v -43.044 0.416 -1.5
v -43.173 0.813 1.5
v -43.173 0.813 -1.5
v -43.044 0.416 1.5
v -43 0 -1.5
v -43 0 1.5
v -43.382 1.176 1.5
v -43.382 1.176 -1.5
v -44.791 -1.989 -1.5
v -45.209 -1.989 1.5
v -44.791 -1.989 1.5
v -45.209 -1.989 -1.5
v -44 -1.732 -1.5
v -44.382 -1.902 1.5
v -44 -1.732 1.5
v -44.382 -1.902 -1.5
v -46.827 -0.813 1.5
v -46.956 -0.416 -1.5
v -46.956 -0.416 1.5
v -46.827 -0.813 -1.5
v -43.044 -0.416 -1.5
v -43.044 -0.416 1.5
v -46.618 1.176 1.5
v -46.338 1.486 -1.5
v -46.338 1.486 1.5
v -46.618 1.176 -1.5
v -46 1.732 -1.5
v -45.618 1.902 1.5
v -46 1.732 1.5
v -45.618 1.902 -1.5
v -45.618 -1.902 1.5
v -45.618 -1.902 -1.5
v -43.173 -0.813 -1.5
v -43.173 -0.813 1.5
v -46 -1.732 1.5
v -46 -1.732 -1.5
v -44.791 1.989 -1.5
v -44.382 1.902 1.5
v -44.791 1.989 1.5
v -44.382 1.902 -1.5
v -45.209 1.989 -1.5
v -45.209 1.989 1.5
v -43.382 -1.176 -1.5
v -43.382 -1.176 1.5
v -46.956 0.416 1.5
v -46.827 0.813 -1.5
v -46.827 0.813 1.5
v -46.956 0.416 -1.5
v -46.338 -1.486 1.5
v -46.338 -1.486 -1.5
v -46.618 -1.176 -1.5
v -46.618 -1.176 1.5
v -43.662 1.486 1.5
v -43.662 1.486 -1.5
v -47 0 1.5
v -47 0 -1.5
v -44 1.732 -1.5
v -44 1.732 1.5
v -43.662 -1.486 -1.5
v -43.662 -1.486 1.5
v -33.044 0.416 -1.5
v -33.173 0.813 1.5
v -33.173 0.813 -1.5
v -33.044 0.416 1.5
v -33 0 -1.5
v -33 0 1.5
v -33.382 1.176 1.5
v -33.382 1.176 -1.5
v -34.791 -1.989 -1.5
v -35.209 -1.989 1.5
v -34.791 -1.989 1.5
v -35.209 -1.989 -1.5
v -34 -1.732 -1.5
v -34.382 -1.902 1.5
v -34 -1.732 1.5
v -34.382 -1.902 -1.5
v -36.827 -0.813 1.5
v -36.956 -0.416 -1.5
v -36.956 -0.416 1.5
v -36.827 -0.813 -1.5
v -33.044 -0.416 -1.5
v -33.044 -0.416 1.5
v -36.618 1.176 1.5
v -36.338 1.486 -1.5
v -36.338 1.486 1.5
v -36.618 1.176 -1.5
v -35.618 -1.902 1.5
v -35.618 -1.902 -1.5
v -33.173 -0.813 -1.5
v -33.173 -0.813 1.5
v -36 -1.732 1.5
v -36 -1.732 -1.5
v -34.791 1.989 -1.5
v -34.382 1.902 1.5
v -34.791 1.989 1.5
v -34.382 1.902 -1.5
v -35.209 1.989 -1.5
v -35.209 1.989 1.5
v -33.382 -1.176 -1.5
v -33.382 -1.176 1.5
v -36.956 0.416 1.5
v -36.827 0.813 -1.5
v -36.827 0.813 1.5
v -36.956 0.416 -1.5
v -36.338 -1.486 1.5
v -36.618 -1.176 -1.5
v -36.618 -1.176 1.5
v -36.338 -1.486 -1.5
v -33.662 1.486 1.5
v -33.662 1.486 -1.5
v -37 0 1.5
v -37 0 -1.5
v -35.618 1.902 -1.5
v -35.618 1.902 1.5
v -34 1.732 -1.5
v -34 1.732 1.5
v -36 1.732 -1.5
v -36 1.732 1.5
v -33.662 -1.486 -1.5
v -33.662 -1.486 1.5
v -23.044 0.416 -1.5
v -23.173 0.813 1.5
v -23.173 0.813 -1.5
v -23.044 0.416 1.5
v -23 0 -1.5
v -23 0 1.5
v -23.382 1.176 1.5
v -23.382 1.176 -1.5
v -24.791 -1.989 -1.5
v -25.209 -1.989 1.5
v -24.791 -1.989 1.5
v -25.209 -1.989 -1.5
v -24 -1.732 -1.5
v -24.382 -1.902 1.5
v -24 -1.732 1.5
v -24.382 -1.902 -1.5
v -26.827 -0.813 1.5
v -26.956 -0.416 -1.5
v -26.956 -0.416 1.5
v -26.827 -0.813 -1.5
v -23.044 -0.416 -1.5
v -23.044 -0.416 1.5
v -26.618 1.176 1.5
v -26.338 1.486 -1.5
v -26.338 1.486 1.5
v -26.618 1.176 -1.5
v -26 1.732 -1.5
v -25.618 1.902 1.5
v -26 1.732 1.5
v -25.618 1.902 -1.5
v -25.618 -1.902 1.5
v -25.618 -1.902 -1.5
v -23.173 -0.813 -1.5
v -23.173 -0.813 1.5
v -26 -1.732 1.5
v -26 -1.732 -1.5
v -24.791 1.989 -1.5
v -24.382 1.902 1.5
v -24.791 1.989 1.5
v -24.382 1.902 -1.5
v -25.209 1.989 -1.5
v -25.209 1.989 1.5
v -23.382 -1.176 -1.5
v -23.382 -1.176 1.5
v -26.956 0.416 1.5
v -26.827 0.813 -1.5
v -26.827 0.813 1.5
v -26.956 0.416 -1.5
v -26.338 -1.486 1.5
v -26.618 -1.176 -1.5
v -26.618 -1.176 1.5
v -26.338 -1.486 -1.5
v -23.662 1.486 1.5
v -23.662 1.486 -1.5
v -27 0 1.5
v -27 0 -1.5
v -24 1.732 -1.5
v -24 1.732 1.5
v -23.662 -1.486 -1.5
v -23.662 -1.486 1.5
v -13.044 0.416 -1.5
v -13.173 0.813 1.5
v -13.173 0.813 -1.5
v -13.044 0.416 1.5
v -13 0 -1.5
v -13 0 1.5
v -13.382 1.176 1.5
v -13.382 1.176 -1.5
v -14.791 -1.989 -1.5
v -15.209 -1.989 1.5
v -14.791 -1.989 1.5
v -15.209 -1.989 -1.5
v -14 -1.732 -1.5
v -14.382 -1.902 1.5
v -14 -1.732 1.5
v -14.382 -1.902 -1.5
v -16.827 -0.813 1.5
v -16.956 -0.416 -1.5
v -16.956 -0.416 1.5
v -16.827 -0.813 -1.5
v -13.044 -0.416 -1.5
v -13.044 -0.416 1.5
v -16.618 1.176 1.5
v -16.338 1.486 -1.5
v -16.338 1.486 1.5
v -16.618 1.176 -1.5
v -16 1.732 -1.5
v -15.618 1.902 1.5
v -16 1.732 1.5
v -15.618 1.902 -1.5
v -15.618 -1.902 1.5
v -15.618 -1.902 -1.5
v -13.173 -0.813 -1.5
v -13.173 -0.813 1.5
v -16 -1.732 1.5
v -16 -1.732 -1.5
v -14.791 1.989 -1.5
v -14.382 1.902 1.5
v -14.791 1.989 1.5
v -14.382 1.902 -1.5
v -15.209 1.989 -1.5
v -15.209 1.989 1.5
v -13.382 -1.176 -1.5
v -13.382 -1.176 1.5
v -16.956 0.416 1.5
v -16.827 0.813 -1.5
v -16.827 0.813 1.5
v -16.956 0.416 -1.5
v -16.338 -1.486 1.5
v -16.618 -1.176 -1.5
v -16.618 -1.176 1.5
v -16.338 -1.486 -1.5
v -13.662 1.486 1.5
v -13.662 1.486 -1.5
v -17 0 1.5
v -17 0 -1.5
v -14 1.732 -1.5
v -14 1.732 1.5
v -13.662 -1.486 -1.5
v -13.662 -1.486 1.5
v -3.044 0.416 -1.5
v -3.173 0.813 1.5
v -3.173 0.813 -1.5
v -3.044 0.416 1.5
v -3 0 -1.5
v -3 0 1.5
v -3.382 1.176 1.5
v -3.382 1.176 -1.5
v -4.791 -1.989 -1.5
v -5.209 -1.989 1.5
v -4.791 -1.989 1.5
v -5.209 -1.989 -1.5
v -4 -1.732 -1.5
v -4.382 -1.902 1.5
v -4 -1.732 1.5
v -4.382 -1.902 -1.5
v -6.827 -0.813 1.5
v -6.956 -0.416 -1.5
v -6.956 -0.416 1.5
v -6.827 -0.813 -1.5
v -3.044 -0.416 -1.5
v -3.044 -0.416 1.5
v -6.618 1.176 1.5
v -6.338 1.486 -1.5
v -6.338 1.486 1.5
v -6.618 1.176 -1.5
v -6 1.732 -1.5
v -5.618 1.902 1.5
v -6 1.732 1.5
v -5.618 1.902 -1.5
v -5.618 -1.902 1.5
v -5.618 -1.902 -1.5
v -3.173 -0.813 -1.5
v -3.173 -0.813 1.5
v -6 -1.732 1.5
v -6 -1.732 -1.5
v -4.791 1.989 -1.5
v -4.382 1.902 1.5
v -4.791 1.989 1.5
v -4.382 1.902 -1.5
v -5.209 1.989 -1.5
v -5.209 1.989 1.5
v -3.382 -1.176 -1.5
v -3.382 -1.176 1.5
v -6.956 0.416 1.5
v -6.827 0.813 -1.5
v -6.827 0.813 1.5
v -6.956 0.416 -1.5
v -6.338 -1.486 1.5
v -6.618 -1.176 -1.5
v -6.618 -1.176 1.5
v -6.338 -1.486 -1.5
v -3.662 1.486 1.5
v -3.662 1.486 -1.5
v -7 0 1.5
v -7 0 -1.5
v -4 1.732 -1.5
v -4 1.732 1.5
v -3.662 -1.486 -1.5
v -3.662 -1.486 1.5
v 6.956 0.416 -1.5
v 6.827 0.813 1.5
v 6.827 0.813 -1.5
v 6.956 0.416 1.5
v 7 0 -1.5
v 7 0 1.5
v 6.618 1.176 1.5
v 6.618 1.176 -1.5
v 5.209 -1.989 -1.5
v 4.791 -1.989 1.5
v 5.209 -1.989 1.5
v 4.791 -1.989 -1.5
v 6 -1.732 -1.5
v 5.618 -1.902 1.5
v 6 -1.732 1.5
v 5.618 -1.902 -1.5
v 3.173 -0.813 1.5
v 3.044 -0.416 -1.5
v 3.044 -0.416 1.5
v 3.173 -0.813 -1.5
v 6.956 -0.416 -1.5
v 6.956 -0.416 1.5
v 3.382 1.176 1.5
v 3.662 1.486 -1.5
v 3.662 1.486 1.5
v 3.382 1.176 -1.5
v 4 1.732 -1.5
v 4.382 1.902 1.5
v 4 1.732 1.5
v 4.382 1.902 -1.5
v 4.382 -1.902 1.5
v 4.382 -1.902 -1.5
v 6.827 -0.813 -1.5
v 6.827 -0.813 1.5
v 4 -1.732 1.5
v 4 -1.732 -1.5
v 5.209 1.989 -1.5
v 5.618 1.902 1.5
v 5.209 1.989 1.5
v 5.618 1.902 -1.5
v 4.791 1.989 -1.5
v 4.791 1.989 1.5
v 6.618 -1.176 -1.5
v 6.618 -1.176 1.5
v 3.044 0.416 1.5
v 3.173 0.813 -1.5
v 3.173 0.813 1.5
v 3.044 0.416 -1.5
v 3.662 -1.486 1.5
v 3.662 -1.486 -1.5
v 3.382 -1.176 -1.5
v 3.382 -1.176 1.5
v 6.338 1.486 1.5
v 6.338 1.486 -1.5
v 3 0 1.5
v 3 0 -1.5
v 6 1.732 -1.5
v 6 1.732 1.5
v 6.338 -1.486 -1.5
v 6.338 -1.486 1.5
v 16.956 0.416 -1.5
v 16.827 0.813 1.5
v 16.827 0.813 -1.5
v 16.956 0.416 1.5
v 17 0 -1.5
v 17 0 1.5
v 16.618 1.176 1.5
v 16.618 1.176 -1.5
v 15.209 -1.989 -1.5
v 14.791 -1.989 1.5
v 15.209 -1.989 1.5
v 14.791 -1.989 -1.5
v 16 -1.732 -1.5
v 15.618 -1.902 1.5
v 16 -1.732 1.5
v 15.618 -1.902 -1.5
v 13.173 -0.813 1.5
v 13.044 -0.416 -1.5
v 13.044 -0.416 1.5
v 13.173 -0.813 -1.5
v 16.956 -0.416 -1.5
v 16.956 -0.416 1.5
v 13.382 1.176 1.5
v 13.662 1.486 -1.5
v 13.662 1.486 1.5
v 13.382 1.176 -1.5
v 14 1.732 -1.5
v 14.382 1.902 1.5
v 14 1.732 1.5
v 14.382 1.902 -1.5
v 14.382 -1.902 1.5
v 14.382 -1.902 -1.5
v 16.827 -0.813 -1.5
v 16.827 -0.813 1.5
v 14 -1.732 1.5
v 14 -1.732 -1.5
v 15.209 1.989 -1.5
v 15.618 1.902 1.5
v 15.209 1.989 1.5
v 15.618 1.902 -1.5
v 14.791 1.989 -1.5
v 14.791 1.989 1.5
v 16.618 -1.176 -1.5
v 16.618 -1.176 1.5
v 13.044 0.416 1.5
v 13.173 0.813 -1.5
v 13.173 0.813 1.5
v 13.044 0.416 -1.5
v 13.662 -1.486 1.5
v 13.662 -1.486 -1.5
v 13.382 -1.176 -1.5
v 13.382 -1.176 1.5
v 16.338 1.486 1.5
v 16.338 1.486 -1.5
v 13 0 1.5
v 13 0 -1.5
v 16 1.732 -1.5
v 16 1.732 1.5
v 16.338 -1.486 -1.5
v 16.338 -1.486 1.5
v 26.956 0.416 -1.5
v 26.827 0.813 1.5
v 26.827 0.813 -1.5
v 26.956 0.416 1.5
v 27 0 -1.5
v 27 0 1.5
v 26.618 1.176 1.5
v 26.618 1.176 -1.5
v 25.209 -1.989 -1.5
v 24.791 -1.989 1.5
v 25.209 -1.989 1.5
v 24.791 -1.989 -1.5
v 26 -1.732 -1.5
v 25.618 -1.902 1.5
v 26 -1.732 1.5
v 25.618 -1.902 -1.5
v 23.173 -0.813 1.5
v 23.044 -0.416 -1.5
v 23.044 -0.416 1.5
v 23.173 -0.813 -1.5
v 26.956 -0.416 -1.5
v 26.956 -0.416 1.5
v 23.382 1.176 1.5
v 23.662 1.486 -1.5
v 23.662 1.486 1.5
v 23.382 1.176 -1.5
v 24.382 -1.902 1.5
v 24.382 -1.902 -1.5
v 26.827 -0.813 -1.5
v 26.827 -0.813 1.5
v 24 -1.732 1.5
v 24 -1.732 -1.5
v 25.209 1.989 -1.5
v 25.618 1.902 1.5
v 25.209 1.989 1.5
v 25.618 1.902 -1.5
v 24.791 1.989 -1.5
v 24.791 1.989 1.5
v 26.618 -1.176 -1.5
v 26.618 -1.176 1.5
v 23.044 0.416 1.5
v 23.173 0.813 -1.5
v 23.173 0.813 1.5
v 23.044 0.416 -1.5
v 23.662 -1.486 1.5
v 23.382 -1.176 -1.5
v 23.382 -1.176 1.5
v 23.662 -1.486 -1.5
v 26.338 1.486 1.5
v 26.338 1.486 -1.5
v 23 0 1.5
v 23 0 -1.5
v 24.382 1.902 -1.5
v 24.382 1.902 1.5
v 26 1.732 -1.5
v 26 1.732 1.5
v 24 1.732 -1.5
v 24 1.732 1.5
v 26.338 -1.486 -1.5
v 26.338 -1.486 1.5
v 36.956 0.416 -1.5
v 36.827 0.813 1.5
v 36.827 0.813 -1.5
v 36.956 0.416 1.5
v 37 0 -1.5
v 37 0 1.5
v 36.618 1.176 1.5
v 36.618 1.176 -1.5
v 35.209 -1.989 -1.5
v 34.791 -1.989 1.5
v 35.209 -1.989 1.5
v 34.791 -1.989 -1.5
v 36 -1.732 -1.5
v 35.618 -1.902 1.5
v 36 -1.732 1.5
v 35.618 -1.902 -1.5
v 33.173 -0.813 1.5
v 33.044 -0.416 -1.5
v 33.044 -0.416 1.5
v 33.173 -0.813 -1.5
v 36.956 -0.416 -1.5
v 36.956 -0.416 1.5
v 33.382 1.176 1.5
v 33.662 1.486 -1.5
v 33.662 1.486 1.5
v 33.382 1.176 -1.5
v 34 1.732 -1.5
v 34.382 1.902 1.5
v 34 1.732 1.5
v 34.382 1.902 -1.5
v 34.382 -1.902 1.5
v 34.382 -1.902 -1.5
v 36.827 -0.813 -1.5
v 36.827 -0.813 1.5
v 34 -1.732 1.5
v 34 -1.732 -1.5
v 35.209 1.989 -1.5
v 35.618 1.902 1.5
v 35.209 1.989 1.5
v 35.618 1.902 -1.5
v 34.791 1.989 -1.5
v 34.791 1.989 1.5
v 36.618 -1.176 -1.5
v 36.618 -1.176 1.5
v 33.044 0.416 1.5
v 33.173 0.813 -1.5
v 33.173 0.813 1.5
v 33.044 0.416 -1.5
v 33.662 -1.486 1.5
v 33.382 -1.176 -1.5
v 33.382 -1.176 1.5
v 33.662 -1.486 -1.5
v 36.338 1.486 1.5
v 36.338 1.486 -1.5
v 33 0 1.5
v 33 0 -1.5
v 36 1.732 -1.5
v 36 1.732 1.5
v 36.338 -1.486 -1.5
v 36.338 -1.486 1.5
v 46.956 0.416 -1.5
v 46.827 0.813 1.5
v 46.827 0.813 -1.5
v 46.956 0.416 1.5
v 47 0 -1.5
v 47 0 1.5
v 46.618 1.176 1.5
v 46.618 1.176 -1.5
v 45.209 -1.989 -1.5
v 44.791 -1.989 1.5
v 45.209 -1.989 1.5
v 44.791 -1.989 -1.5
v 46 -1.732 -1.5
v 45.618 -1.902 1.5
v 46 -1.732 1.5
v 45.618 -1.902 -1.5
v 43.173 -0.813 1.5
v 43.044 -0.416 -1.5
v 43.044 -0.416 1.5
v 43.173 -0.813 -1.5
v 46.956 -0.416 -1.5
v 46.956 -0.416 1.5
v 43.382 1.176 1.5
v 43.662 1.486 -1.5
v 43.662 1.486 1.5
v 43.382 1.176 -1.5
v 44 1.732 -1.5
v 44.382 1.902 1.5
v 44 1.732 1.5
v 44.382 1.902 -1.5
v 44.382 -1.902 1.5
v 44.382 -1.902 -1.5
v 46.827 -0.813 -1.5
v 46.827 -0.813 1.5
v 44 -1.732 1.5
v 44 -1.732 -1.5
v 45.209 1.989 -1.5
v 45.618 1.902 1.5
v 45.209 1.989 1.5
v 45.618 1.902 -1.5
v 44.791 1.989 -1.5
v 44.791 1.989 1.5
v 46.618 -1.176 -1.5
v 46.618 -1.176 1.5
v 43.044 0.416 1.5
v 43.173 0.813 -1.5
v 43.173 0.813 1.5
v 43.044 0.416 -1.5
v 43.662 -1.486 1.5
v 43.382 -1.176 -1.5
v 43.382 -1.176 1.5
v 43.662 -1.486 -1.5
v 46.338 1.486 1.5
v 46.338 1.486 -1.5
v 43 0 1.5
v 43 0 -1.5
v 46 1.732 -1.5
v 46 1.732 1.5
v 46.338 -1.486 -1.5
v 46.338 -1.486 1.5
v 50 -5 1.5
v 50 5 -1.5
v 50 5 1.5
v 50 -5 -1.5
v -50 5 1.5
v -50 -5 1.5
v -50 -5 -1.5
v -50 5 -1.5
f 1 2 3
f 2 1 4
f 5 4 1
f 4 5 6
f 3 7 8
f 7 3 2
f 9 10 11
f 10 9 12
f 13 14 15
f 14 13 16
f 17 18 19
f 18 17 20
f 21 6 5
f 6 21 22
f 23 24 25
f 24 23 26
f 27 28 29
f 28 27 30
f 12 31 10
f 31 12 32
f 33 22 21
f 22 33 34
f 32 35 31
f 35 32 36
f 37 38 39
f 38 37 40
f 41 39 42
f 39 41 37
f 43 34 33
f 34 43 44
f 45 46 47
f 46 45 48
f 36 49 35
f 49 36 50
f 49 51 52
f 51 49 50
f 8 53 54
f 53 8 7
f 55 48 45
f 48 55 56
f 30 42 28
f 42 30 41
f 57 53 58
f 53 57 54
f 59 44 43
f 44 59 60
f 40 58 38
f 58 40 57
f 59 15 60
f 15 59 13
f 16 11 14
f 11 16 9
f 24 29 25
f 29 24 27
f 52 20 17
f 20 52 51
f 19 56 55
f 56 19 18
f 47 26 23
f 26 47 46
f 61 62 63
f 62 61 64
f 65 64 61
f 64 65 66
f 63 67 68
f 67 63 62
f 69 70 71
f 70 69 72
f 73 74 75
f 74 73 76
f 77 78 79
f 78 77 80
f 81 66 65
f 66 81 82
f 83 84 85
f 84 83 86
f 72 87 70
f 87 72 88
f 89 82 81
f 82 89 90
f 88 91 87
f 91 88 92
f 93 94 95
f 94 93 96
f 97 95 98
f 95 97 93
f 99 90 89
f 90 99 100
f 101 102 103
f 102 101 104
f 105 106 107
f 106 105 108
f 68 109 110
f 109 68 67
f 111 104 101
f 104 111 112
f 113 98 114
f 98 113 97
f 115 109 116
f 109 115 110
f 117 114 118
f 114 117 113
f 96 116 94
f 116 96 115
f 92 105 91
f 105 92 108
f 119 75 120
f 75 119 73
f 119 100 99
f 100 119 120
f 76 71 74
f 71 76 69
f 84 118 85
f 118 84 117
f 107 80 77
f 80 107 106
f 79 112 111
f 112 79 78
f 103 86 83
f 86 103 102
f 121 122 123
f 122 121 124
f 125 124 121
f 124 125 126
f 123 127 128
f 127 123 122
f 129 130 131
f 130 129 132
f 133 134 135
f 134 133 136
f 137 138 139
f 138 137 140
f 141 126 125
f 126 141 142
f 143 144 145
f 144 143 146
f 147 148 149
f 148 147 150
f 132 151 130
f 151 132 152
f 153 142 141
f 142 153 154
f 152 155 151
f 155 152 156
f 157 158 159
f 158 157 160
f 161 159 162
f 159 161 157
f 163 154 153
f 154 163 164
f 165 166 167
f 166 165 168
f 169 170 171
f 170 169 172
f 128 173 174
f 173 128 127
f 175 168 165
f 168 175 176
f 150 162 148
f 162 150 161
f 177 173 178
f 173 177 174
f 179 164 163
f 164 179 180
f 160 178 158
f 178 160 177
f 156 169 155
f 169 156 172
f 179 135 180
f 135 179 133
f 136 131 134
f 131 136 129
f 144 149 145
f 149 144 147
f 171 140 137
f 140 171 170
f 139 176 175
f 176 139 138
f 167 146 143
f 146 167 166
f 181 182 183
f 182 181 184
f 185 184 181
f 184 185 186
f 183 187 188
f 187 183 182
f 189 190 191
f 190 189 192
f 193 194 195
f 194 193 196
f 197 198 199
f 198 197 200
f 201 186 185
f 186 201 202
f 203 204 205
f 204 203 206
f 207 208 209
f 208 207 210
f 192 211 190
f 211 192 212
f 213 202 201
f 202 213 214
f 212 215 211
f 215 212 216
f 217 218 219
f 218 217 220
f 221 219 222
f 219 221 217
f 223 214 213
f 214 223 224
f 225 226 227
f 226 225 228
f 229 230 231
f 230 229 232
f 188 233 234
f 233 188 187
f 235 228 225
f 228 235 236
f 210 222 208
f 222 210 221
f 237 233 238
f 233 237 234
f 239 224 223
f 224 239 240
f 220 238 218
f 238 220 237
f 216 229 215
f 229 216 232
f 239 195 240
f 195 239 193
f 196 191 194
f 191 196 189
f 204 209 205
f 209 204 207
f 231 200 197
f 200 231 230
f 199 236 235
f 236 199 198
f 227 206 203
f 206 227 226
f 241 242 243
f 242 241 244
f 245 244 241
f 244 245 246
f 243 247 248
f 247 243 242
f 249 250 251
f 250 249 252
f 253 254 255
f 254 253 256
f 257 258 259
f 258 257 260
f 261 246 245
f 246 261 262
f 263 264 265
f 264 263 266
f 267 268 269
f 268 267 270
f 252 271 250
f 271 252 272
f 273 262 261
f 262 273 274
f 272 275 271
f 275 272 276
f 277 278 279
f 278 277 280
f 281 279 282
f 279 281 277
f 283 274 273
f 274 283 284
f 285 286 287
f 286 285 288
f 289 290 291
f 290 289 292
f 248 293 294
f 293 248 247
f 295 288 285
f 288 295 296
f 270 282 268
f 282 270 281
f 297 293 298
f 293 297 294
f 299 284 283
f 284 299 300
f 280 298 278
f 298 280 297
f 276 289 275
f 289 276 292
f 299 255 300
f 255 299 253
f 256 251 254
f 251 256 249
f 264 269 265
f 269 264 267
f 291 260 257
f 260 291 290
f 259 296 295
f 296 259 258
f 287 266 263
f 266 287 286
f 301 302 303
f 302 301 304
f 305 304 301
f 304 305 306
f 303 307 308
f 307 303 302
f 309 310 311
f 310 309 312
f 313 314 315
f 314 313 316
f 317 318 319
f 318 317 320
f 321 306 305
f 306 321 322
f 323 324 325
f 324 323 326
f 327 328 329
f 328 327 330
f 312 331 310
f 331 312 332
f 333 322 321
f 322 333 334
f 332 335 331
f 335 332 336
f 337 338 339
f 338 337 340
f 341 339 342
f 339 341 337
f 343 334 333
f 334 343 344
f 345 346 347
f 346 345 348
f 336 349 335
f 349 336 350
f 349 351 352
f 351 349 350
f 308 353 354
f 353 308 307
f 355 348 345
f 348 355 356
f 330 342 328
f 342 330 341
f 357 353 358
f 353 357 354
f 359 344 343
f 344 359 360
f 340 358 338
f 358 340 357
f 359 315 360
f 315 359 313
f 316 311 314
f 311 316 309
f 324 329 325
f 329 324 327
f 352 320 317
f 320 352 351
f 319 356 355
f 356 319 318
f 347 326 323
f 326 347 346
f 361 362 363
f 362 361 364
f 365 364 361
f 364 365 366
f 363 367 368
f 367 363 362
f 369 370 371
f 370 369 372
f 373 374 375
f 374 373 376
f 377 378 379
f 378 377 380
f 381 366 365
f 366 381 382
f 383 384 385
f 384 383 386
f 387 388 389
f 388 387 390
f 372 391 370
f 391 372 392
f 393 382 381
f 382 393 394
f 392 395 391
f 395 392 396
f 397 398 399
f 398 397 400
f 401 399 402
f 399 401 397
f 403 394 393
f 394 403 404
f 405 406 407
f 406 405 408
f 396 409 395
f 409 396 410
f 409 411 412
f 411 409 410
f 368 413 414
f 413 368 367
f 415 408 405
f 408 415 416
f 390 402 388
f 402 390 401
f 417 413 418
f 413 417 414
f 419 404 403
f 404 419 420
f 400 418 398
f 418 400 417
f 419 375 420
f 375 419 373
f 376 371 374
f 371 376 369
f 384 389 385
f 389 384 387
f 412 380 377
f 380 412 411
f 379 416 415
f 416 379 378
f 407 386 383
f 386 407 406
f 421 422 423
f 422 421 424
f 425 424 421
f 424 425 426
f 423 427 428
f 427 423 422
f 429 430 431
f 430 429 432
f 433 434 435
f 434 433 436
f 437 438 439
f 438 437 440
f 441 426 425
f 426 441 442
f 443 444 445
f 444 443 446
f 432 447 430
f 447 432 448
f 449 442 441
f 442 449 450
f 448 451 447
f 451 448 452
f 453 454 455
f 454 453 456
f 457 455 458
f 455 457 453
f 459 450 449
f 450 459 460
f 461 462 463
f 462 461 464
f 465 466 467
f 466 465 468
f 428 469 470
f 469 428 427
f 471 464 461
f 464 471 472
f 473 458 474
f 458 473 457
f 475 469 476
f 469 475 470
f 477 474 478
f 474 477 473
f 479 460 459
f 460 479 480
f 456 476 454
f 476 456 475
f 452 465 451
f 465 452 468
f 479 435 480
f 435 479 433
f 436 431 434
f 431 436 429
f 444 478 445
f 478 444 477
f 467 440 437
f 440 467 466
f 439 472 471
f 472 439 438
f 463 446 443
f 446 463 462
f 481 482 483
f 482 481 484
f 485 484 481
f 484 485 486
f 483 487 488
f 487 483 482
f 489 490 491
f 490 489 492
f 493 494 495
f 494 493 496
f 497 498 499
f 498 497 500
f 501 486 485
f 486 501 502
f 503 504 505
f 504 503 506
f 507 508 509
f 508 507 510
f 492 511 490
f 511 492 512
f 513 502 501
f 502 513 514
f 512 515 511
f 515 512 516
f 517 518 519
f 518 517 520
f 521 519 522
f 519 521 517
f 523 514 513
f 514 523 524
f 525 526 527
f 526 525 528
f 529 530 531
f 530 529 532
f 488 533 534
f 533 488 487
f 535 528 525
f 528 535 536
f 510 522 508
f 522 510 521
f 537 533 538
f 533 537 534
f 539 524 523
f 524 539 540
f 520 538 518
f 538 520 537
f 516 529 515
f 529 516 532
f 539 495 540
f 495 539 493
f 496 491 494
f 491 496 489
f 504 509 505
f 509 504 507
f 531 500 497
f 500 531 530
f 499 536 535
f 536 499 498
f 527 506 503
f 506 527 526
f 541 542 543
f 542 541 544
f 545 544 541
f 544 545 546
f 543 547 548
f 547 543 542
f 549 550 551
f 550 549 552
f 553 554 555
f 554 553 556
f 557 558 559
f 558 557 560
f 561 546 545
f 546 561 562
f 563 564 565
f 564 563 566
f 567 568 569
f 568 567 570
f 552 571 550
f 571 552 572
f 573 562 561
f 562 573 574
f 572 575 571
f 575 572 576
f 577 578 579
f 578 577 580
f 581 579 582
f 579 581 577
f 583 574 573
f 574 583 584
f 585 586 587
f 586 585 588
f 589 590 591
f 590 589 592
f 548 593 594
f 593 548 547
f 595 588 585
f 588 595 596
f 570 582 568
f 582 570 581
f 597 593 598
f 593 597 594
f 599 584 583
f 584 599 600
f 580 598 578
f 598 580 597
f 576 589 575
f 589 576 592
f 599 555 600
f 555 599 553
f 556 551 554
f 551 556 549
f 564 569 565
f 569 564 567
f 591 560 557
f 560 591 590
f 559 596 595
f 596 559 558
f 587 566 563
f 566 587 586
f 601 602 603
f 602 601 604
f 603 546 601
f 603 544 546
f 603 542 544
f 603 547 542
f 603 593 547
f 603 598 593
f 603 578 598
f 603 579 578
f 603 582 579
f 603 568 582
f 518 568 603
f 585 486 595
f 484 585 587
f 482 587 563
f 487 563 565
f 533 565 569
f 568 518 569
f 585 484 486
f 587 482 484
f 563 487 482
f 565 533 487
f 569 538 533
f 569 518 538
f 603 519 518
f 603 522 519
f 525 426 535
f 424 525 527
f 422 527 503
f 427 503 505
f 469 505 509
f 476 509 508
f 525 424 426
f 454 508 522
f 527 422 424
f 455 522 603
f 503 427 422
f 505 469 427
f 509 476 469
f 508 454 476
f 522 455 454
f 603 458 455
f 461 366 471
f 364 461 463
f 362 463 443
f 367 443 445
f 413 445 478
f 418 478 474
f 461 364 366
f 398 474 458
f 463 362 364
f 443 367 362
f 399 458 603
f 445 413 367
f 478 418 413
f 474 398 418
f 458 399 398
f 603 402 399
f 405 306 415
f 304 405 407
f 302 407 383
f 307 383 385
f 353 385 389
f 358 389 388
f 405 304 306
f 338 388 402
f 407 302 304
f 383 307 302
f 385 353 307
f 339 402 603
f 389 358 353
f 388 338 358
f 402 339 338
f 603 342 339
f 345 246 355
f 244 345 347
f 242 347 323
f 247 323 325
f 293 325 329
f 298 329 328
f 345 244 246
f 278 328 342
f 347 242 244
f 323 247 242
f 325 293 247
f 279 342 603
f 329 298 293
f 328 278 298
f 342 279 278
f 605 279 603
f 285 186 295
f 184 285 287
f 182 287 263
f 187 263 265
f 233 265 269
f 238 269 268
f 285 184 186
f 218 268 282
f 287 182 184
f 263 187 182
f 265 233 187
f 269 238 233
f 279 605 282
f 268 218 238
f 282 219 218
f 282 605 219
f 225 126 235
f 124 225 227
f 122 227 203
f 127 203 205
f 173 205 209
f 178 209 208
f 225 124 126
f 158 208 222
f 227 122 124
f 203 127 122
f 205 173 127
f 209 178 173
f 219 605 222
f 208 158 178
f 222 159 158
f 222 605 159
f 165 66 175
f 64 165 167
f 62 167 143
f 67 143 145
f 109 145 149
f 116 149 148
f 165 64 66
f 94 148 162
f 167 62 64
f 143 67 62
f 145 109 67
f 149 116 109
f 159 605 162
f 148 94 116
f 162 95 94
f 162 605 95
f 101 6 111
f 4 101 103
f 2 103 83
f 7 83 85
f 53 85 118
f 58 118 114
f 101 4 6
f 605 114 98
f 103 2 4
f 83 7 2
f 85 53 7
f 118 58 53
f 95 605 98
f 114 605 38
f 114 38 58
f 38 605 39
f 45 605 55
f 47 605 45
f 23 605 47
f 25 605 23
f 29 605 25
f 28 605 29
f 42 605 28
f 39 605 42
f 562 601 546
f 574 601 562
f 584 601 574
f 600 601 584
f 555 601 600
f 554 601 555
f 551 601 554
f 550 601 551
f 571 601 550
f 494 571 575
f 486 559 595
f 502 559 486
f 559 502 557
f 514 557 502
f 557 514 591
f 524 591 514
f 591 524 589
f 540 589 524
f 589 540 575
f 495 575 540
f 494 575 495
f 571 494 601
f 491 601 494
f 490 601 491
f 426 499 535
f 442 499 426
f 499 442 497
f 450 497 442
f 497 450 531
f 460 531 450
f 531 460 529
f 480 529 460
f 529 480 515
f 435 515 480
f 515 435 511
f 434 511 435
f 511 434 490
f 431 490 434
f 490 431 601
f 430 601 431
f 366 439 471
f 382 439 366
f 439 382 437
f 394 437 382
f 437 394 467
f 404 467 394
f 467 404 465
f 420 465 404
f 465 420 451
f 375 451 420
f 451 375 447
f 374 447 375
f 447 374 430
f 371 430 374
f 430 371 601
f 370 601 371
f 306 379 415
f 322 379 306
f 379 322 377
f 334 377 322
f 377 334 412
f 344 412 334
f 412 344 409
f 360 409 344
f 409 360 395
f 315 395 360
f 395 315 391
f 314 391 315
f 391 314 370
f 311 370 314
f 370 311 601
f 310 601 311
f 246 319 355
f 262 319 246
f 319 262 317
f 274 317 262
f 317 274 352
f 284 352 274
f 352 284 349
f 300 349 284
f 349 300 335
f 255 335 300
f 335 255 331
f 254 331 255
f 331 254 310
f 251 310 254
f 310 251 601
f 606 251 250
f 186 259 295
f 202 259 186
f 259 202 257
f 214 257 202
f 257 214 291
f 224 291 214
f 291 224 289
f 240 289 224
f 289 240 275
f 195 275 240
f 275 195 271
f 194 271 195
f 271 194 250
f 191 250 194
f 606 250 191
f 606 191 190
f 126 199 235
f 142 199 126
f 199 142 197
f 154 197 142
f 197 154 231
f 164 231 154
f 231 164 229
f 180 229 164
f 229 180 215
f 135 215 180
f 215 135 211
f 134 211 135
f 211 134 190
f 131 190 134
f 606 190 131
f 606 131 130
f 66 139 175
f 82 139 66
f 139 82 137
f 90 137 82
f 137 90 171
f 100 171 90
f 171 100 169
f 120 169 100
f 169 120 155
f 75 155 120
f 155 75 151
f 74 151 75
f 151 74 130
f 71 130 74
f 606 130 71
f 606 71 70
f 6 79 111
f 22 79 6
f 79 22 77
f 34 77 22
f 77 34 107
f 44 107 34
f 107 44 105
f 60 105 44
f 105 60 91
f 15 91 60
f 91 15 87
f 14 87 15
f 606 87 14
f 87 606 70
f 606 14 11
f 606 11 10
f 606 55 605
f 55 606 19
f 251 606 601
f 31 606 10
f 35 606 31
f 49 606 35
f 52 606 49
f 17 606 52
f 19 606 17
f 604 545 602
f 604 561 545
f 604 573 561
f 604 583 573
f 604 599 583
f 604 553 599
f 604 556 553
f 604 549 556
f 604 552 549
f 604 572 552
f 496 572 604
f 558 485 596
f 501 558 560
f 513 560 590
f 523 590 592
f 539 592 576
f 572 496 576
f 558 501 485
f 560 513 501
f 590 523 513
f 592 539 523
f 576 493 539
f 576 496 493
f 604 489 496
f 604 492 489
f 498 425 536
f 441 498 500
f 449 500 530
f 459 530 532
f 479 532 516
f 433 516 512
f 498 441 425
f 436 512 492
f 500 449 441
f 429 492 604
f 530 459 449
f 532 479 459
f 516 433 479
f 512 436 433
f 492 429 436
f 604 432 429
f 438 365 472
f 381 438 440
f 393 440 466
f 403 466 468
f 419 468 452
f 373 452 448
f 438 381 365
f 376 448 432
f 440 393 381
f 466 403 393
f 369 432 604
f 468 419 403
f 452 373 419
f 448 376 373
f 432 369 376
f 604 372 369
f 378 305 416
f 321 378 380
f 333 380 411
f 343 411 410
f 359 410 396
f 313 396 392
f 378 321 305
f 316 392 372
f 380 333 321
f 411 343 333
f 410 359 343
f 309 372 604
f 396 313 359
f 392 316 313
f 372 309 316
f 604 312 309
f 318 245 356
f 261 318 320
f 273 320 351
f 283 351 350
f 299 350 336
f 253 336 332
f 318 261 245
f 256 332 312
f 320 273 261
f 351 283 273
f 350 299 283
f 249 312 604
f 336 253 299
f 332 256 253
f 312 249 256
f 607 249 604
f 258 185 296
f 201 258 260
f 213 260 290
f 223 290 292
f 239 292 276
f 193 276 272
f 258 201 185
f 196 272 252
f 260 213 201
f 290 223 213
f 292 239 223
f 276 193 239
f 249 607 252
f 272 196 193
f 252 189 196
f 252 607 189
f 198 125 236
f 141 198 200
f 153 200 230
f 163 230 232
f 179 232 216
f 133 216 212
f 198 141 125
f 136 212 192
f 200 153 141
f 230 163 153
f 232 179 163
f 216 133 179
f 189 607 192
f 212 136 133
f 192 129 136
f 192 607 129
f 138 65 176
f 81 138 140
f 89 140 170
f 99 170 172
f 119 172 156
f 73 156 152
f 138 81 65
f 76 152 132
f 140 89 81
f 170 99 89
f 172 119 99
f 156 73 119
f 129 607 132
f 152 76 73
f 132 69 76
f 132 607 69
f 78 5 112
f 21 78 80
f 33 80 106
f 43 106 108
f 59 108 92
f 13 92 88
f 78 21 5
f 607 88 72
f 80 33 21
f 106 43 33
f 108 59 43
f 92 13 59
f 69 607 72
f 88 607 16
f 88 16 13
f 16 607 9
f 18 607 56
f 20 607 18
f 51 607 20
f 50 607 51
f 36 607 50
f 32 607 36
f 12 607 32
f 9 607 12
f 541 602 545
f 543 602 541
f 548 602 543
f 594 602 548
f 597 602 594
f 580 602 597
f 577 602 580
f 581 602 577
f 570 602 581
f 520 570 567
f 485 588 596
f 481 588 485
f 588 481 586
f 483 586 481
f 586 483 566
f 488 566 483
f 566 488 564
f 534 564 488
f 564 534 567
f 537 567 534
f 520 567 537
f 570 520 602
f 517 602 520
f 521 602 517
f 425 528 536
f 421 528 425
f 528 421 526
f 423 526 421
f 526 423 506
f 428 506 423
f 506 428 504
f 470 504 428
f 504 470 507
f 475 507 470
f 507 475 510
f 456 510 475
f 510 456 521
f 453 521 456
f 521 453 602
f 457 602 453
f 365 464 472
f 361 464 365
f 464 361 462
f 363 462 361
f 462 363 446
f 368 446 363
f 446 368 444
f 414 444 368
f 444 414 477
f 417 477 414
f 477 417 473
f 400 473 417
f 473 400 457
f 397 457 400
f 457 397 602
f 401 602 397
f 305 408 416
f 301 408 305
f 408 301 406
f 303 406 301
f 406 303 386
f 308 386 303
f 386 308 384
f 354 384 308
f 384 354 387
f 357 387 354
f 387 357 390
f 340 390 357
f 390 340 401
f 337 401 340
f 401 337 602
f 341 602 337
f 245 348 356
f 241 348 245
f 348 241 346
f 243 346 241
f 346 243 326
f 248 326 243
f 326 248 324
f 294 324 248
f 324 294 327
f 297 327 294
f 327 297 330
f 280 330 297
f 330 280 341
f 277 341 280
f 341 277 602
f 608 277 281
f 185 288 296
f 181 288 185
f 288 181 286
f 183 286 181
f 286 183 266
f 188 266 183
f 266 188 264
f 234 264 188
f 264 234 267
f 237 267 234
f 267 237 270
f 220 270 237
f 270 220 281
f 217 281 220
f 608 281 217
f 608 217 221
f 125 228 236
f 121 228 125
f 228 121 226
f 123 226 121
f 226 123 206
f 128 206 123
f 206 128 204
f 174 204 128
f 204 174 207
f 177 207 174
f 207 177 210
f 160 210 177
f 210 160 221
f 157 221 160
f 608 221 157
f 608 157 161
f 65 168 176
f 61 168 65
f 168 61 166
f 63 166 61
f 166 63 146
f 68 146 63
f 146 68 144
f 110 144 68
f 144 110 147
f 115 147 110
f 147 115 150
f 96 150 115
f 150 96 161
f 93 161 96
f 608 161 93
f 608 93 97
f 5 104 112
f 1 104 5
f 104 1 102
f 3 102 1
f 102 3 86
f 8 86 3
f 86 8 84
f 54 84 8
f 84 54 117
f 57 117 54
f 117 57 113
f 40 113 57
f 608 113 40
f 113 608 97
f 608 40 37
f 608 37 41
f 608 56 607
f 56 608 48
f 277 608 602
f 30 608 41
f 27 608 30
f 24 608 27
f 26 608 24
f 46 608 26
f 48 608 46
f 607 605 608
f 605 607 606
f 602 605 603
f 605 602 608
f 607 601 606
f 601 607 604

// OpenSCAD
// Ejemplo de una pieza de mecano paramétrico
//---------------------------------------------
// Definición del tamaño de taladro
drill=4;
d=10;
n=10;    // Núnmero de agujeros
// Definición tamaño pieza
lx = n*d;
anchura = 10;
grosor = 3;

// Dibujamos la figura
translate([-lx/2, 0, 0])
difference(){
    // Definimos la figura
    translate([lx/2, 0, 0])
    cube([lx, anchura, grosor], center = true);
    // Repetimos los taladros a lo largo de la figura
    for(i=[0:n-1]){
        translate([d*i+d/2,0, 0])
        cylinder(r=drill/2, h=grosor*2, $fn=30, center = true);
        }
}
